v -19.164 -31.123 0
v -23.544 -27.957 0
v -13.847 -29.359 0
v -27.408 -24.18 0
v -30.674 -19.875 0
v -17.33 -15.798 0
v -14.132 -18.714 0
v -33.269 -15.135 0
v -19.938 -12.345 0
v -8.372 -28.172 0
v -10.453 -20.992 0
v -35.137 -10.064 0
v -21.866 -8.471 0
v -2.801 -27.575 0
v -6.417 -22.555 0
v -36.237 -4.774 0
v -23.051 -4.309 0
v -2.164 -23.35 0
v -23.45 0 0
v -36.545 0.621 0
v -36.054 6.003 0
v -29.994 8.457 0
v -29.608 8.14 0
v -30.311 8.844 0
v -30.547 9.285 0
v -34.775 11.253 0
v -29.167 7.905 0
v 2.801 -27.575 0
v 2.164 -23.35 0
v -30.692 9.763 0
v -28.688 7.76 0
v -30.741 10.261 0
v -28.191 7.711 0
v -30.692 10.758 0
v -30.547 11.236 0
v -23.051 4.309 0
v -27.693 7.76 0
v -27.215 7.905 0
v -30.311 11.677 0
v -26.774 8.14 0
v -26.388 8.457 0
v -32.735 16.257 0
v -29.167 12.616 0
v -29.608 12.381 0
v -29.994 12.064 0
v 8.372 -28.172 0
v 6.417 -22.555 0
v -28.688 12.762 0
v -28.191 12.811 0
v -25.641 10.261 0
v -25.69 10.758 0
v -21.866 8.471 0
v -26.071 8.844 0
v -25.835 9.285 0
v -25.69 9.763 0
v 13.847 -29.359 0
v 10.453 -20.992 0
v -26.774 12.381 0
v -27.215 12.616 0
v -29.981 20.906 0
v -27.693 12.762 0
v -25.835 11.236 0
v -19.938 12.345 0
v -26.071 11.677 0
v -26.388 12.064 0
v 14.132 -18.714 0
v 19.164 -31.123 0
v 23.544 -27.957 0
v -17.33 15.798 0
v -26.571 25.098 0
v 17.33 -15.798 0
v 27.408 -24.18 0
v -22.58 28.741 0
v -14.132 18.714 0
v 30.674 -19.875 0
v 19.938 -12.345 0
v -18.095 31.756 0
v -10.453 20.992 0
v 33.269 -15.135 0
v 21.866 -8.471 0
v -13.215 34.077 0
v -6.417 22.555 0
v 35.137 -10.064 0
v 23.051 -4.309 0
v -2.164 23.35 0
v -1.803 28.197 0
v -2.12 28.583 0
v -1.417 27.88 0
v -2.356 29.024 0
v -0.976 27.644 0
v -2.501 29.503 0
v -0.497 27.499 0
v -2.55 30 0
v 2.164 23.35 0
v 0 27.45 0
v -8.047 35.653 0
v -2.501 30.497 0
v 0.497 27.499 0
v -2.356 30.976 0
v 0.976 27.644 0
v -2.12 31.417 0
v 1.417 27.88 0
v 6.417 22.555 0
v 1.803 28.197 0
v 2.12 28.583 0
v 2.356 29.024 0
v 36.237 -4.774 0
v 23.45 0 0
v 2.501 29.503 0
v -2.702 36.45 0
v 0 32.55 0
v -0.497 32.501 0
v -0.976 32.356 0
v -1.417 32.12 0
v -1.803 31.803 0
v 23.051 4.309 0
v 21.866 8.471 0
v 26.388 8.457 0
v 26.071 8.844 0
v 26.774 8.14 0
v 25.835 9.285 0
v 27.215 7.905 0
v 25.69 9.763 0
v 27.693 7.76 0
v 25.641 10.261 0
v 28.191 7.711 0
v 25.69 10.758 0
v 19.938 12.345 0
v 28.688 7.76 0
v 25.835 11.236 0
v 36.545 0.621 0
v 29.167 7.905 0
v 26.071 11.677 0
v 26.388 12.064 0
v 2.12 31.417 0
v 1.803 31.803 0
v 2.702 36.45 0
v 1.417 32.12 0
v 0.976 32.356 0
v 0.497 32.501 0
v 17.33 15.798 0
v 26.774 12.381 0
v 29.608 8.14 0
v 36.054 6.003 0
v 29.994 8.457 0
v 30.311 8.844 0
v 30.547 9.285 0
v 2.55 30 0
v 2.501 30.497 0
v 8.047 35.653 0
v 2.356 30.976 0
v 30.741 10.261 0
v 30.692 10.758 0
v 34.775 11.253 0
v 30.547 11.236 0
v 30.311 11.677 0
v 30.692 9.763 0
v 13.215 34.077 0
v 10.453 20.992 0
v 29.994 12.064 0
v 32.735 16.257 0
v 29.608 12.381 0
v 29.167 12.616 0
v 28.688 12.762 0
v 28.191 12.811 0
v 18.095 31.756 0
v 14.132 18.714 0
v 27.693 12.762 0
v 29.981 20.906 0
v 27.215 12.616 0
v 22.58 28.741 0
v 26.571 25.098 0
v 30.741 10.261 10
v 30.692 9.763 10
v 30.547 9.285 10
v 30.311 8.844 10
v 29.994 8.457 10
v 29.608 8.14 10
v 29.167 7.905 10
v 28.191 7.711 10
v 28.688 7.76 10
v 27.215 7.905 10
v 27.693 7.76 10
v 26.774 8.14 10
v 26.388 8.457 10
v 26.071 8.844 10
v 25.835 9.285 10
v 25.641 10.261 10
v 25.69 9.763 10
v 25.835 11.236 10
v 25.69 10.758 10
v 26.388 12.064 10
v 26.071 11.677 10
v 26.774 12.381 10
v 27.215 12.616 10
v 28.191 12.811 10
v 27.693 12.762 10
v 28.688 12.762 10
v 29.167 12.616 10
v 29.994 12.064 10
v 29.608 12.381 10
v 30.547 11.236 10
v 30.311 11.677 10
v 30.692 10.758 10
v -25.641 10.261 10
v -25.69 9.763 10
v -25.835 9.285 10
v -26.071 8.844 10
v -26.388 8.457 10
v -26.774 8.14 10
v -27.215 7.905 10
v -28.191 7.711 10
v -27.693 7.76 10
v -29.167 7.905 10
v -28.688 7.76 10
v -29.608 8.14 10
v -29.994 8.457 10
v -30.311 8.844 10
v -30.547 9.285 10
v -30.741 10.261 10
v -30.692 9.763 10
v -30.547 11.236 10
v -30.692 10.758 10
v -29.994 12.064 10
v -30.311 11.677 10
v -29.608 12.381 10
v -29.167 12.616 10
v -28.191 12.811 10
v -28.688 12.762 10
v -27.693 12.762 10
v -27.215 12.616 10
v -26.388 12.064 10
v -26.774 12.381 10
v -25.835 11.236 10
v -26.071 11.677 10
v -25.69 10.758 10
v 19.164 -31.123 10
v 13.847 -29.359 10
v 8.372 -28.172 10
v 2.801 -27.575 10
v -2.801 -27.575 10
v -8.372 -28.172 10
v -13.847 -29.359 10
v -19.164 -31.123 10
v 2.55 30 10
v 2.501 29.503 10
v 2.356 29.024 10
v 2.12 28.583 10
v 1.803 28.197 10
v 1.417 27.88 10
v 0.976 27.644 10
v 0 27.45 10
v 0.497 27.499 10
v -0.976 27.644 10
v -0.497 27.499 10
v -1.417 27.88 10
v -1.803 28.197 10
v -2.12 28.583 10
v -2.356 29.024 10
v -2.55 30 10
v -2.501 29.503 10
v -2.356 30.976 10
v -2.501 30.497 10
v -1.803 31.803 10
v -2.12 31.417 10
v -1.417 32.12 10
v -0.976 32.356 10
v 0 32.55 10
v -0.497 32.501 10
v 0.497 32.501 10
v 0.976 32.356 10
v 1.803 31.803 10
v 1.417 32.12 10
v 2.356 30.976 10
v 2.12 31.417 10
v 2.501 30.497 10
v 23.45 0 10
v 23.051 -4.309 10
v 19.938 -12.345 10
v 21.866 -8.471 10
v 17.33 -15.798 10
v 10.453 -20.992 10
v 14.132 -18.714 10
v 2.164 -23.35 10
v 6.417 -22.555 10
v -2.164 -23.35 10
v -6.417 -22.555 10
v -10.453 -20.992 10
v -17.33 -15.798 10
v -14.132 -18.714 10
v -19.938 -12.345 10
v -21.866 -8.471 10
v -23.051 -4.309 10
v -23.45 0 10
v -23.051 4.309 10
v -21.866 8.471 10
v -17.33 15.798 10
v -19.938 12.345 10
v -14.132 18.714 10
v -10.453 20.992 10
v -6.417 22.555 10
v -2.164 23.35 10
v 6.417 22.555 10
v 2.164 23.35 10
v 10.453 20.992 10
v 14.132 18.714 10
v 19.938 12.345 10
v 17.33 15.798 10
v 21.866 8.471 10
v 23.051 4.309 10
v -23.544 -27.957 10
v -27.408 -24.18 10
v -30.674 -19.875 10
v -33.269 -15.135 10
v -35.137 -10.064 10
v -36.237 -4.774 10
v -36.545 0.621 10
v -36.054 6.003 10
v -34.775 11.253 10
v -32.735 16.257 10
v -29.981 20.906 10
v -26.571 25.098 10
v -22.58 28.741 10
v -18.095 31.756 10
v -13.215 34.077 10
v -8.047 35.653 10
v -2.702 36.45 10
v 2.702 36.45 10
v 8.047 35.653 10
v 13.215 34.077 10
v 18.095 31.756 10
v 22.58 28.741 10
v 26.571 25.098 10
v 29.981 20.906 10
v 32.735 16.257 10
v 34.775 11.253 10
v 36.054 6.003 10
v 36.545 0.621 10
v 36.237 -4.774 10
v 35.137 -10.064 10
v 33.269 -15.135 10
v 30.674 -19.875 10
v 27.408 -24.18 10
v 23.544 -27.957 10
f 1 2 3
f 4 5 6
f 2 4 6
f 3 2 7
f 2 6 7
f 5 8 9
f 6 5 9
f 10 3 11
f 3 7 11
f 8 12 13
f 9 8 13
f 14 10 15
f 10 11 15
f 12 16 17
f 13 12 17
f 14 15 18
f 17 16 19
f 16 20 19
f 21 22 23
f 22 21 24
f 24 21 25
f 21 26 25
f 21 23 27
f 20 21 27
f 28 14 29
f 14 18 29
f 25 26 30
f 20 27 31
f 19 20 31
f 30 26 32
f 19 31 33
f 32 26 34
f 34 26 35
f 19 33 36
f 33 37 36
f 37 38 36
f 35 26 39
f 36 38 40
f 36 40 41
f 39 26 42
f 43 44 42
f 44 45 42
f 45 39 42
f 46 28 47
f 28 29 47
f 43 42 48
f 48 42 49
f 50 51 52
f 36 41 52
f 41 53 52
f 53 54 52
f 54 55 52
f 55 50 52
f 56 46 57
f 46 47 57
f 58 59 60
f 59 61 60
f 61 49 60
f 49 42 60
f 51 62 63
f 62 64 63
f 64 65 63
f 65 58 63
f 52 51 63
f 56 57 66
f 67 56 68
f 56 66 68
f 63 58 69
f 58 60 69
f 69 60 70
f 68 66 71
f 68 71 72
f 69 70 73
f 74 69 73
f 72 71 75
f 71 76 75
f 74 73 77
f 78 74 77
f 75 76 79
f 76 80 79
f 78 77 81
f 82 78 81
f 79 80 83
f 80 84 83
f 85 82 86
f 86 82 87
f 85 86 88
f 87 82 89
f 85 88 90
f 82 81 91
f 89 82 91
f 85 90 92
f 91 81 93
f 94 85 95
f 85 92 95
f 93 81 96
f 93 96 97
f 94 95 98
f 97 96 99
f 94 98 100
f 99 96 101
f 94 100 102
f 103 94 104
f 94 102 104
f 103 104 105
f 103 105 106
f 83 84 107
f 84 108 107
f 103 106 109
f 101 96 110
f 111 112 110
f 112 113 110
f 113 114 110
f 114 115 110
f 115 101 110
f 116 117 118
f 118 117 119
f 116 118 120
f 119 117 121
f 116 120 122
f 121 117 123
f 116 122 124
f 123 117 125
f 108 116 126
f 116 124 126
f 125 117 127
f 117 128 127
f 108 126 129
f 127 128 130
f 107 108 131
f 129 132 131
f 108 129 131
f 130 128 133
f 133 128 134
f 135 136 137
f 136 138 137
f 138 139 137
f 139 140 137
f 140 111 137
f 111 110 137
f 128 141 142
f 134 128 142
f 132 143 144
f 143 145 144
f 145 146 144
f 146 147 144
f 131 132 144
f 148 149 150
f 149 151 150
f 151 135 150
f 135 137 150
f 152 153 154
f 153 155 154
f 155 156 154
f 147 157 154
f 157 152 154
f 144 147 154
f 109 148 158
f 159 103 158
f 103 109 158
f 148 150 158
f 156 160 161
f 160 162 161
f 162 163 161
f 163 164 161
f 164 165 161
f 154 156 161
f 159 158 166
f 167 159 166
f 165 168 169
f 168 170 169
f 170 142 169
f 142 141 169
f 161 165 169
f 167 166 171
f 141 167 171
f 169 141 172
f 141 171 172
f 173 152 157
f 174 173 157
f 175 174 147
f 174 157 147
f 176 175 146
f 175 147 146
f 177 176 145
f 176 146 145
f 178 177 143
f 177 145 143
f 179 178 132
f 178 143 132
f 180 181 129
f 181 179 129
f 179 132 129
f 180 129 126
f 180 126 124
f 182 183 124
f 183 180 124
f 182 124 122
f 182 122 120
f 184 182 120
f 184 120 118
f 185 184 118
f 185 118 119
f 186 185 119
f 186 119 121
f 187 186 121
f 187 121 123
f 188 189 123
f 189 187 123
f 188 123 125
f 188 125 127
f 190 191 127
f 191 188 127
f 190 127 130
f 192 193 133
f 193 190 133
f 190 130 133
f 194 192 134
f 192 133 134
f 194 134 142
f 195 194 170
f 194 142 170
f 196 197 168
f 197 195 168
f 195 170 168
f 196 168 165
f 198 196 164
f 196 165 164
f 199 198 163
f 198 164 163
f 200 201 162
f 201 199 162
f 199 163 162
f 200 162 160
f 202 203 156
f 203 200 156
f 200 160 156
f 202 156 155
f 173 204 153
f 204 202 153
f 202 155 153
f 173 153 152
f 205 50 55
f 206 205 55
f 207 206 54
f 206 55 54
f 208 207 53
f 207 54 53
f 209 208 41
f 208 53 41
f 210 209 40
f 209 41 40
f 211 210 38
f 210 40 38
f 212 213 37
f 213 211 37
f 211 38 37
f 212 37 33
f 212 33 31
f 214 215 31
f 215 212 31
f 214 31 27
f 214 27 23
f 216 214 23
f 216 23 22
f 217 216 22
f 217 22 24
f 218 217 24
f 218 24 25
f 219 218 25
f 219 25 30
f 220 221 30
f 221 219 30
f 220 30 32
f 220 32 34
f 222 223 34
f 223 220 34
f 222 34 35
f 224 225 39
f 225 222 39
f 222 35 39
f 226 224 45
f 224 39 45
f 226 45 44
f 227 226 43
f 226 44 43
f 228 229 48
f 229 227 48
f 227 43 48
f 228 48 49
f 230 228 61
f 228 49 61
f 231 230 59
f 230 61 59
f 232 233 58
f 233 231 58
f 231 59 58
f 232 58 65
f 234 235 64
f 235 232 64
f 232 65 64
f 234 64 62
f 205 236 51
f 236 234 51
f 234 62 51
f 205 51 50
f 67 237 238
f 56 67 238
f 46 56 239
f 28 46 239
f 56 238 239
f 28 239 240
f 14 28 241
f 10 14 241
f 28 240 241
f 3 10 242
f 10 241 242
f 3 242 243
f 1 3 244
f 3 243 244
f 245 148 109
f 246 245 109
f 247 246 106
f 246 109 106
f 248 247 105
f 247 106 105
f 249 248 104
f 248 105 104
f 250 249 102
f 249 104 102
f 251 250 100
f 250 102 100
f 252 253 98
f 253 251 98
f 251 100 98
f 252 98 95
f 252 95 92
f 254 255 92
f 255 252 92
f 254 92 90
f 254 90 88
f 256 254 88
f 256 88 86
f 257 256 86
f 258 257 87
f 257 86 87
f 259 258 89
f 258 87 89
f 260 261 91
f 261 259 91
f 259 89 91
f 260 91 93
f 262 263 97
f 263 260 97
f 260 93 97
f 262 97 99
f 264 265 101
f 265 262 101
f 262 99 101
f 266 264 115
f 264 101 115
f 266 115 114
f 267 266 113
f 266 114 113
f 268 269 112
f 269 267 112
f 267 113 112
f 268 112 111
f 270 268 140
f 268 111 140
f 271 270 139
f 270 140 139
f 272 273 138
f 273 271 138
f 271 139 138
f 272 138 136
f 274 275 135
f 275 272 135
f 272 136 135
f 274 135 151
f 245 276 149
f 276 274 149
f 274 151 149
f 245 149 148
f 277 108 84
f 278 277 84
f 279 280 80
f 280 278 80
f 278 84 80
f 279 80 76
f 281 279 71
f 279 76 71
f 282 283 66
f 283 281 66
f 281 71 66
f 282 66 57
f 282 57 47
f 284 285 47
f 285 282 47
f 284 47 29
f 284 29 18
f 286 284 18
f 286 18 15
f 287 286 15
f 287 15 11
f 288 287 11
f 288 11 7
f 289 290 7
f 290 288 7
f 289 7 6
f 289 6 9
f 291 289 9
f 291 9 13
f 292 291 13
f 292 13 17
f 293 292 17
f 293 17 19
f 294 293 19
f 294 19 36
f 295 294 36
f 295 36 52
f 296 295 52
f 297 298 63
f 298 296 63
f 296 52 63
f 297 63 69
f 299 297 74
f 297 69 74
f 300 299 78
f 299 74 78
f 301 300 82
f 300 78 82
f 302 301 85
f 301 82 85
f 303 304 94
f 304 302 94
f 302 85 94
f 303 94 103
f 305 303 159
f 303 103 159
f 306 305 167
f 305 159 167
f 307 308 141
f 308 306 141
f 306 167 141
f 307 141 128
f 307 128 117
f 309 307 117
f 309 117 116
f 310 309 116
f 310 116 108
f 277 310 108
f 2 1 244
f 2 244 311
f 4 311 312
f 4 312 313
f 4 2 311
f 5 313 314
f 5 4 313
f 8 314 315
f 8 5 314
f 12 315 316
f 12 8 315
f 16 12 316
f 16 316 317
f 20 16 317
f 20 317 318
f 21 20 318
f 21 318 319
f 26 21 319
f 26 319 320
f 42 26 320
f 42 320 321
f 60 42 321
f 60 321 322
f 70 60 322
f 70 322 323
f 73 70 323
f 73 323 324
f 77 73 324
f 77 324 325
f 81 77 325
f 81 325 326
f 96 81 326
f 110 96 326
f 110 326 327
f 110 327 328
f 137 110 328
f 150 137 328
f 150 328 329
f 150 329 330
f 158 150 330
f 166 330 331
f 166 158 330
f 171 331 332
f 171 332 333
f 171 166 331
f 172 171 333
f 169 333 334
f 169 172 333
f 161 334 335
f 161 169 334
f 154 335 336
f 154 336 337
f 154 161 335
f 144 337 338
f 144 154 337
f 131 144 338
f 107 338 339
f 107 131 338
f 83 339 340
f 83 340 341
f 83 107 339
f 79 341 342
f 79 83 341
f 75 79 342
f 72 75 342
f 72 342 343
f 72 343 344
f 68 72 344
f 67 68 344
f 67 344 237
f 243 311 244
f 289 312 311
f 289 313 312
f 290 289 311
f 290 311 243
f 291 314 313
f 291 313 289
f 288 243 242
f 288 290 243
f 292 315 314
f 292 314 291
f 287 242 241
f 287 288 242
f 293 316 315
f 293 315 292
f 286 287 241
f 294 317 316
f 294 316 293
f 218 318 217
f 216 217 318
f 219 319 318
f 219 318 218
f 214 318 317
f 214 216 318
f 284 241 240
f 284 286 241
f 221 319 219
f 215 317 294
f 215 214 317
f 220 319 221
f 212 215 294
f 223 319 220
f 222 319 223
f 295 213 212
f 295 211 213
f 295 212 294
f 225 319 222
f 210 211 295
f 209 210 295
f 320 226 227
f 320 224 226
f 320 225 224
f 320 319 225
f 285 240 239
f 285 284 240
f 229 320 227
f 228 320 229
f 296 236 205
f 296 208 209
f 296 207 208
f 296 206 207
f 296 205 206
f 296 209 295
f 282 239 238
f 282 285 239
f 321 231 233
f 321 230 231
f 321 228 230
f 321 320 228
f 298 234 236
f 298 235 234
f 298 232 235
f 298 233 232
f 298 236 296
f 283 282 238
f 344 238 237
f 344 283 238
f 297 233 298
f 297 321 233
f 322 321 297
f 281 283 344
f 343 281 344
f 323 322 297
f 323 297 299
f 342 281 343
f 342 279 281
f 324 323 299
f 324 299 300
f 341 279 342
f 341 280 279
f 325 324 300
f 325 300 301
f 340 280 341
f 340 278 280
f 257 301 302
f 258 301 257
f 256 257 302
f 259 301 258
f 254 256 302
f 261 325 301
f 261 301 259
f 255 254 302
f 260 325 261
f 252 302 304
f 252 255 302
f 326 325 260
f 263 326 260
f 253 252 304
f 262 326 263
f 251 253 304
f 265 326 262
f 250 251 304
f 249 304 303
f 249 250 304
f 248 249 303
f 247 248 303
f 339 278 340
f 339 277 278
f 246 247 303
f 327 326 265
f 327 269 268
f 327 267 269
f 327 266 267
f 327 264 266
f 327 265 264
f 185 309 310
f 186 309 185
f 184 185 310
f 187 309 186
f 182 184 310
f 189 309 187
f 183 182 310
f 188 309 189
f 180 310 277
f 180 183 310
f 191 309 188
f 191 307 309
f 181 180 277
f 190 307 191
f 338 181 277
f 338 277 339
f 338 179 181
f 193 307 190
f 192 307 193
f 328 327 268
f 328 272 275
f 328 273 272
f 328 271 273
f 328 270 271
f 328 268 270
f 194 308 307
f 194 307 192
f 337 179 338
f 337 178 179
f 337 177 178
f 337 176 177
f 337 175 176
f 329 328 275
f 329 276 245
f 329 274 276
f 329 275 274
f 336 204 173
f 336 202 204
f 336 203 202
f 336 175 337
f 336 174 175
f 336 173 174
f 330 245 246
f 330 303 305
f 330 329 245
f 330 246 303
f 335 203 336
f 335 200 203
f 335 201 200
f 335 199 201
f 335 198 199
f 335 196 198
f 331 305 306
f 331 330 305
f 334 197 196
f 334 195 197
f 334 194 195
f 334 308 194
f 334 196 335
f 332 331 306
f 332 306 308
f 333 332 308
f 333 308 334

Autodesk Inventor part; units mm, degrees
ref_plane "YZ Plane" through (0, 0, 0) normal (1, 0, 0) x (0, 1, 0)
ref_plane "XZ Plane" through (0, 0, 0) normal (0, 1, 0) x (-1, 0, 0)
ref_plane "XY Plane" through (0, 0, 0) normal (0, 0, 1) x (1, 0, 0)
sketch "スケッチ1" plane through (0, 0, 0) normal (0, 0, 1) x (1, 0, 0)
  circle A0 centre (0, 0) radius 23.45
  circle A1 centre (0, 0) radius 36.55
  line L0 (0, 0) -> (-28.1908, 10.2606) construction
  line L1 (0, 0) -> (28.1908, 10.2606) construction
  line L2 (-39.5959, 0) -> (43.1917, 0) construction
  line L3 (0, 0) -> (0, 30) construction
  circle A2 centre (-28.1908, 10.2606) radius 2.55
  circle A3 centre (0, 30) radius 2.55
  circle A4 centre (28.1908, 10.2606) radius 2.55
  dimension "d0" = 73.1
  dimension "d1" = 46.9
  dimension "d2" = 30
  dimension "d3" = 30
  dimension "d6" = 20
  dimension "d7" = 20
  dimension "d8" = 30
  dimension "d9" = 5.1
  dimension "d10" = 5.1
  dimension "d11" = 5.1
extrude "押し出し1" add sketch "スケッチ1" along normal blind 10
sketch "スケッチ2" plane through (0, 0, 10) normal (0, 0, 1) x (1, 0, 0)
  line L0 (0, 0) -> (0, -80) construction
  circle A0 centre (0, -80) radius 52.5
  dimension "d14" = 80
  dimension "d18" = 105
extrude "押し出し2" cut sketch "スケッチ2" against normal blind 10
sketch "スケッチ3" plane through (0, 0, 10) normal (0, 0, 1) x (1, 0, 0)
  circle A0 centre (28.1908, 10.2606) radius 2.55 projected
  line L0 (0, 0) -> (28.1908, 10.2606)
  circle A1 centre (-28.1908, 10.2606) radius 2.55 projected
  line L1 (-28.1908, 10.2606) -> (0, 0)
  circle A2 centre (0, 30) radius 2.55 projected
  line L2 (0, 0) -> (0, 30)
properties part number "円 46.9mm"
